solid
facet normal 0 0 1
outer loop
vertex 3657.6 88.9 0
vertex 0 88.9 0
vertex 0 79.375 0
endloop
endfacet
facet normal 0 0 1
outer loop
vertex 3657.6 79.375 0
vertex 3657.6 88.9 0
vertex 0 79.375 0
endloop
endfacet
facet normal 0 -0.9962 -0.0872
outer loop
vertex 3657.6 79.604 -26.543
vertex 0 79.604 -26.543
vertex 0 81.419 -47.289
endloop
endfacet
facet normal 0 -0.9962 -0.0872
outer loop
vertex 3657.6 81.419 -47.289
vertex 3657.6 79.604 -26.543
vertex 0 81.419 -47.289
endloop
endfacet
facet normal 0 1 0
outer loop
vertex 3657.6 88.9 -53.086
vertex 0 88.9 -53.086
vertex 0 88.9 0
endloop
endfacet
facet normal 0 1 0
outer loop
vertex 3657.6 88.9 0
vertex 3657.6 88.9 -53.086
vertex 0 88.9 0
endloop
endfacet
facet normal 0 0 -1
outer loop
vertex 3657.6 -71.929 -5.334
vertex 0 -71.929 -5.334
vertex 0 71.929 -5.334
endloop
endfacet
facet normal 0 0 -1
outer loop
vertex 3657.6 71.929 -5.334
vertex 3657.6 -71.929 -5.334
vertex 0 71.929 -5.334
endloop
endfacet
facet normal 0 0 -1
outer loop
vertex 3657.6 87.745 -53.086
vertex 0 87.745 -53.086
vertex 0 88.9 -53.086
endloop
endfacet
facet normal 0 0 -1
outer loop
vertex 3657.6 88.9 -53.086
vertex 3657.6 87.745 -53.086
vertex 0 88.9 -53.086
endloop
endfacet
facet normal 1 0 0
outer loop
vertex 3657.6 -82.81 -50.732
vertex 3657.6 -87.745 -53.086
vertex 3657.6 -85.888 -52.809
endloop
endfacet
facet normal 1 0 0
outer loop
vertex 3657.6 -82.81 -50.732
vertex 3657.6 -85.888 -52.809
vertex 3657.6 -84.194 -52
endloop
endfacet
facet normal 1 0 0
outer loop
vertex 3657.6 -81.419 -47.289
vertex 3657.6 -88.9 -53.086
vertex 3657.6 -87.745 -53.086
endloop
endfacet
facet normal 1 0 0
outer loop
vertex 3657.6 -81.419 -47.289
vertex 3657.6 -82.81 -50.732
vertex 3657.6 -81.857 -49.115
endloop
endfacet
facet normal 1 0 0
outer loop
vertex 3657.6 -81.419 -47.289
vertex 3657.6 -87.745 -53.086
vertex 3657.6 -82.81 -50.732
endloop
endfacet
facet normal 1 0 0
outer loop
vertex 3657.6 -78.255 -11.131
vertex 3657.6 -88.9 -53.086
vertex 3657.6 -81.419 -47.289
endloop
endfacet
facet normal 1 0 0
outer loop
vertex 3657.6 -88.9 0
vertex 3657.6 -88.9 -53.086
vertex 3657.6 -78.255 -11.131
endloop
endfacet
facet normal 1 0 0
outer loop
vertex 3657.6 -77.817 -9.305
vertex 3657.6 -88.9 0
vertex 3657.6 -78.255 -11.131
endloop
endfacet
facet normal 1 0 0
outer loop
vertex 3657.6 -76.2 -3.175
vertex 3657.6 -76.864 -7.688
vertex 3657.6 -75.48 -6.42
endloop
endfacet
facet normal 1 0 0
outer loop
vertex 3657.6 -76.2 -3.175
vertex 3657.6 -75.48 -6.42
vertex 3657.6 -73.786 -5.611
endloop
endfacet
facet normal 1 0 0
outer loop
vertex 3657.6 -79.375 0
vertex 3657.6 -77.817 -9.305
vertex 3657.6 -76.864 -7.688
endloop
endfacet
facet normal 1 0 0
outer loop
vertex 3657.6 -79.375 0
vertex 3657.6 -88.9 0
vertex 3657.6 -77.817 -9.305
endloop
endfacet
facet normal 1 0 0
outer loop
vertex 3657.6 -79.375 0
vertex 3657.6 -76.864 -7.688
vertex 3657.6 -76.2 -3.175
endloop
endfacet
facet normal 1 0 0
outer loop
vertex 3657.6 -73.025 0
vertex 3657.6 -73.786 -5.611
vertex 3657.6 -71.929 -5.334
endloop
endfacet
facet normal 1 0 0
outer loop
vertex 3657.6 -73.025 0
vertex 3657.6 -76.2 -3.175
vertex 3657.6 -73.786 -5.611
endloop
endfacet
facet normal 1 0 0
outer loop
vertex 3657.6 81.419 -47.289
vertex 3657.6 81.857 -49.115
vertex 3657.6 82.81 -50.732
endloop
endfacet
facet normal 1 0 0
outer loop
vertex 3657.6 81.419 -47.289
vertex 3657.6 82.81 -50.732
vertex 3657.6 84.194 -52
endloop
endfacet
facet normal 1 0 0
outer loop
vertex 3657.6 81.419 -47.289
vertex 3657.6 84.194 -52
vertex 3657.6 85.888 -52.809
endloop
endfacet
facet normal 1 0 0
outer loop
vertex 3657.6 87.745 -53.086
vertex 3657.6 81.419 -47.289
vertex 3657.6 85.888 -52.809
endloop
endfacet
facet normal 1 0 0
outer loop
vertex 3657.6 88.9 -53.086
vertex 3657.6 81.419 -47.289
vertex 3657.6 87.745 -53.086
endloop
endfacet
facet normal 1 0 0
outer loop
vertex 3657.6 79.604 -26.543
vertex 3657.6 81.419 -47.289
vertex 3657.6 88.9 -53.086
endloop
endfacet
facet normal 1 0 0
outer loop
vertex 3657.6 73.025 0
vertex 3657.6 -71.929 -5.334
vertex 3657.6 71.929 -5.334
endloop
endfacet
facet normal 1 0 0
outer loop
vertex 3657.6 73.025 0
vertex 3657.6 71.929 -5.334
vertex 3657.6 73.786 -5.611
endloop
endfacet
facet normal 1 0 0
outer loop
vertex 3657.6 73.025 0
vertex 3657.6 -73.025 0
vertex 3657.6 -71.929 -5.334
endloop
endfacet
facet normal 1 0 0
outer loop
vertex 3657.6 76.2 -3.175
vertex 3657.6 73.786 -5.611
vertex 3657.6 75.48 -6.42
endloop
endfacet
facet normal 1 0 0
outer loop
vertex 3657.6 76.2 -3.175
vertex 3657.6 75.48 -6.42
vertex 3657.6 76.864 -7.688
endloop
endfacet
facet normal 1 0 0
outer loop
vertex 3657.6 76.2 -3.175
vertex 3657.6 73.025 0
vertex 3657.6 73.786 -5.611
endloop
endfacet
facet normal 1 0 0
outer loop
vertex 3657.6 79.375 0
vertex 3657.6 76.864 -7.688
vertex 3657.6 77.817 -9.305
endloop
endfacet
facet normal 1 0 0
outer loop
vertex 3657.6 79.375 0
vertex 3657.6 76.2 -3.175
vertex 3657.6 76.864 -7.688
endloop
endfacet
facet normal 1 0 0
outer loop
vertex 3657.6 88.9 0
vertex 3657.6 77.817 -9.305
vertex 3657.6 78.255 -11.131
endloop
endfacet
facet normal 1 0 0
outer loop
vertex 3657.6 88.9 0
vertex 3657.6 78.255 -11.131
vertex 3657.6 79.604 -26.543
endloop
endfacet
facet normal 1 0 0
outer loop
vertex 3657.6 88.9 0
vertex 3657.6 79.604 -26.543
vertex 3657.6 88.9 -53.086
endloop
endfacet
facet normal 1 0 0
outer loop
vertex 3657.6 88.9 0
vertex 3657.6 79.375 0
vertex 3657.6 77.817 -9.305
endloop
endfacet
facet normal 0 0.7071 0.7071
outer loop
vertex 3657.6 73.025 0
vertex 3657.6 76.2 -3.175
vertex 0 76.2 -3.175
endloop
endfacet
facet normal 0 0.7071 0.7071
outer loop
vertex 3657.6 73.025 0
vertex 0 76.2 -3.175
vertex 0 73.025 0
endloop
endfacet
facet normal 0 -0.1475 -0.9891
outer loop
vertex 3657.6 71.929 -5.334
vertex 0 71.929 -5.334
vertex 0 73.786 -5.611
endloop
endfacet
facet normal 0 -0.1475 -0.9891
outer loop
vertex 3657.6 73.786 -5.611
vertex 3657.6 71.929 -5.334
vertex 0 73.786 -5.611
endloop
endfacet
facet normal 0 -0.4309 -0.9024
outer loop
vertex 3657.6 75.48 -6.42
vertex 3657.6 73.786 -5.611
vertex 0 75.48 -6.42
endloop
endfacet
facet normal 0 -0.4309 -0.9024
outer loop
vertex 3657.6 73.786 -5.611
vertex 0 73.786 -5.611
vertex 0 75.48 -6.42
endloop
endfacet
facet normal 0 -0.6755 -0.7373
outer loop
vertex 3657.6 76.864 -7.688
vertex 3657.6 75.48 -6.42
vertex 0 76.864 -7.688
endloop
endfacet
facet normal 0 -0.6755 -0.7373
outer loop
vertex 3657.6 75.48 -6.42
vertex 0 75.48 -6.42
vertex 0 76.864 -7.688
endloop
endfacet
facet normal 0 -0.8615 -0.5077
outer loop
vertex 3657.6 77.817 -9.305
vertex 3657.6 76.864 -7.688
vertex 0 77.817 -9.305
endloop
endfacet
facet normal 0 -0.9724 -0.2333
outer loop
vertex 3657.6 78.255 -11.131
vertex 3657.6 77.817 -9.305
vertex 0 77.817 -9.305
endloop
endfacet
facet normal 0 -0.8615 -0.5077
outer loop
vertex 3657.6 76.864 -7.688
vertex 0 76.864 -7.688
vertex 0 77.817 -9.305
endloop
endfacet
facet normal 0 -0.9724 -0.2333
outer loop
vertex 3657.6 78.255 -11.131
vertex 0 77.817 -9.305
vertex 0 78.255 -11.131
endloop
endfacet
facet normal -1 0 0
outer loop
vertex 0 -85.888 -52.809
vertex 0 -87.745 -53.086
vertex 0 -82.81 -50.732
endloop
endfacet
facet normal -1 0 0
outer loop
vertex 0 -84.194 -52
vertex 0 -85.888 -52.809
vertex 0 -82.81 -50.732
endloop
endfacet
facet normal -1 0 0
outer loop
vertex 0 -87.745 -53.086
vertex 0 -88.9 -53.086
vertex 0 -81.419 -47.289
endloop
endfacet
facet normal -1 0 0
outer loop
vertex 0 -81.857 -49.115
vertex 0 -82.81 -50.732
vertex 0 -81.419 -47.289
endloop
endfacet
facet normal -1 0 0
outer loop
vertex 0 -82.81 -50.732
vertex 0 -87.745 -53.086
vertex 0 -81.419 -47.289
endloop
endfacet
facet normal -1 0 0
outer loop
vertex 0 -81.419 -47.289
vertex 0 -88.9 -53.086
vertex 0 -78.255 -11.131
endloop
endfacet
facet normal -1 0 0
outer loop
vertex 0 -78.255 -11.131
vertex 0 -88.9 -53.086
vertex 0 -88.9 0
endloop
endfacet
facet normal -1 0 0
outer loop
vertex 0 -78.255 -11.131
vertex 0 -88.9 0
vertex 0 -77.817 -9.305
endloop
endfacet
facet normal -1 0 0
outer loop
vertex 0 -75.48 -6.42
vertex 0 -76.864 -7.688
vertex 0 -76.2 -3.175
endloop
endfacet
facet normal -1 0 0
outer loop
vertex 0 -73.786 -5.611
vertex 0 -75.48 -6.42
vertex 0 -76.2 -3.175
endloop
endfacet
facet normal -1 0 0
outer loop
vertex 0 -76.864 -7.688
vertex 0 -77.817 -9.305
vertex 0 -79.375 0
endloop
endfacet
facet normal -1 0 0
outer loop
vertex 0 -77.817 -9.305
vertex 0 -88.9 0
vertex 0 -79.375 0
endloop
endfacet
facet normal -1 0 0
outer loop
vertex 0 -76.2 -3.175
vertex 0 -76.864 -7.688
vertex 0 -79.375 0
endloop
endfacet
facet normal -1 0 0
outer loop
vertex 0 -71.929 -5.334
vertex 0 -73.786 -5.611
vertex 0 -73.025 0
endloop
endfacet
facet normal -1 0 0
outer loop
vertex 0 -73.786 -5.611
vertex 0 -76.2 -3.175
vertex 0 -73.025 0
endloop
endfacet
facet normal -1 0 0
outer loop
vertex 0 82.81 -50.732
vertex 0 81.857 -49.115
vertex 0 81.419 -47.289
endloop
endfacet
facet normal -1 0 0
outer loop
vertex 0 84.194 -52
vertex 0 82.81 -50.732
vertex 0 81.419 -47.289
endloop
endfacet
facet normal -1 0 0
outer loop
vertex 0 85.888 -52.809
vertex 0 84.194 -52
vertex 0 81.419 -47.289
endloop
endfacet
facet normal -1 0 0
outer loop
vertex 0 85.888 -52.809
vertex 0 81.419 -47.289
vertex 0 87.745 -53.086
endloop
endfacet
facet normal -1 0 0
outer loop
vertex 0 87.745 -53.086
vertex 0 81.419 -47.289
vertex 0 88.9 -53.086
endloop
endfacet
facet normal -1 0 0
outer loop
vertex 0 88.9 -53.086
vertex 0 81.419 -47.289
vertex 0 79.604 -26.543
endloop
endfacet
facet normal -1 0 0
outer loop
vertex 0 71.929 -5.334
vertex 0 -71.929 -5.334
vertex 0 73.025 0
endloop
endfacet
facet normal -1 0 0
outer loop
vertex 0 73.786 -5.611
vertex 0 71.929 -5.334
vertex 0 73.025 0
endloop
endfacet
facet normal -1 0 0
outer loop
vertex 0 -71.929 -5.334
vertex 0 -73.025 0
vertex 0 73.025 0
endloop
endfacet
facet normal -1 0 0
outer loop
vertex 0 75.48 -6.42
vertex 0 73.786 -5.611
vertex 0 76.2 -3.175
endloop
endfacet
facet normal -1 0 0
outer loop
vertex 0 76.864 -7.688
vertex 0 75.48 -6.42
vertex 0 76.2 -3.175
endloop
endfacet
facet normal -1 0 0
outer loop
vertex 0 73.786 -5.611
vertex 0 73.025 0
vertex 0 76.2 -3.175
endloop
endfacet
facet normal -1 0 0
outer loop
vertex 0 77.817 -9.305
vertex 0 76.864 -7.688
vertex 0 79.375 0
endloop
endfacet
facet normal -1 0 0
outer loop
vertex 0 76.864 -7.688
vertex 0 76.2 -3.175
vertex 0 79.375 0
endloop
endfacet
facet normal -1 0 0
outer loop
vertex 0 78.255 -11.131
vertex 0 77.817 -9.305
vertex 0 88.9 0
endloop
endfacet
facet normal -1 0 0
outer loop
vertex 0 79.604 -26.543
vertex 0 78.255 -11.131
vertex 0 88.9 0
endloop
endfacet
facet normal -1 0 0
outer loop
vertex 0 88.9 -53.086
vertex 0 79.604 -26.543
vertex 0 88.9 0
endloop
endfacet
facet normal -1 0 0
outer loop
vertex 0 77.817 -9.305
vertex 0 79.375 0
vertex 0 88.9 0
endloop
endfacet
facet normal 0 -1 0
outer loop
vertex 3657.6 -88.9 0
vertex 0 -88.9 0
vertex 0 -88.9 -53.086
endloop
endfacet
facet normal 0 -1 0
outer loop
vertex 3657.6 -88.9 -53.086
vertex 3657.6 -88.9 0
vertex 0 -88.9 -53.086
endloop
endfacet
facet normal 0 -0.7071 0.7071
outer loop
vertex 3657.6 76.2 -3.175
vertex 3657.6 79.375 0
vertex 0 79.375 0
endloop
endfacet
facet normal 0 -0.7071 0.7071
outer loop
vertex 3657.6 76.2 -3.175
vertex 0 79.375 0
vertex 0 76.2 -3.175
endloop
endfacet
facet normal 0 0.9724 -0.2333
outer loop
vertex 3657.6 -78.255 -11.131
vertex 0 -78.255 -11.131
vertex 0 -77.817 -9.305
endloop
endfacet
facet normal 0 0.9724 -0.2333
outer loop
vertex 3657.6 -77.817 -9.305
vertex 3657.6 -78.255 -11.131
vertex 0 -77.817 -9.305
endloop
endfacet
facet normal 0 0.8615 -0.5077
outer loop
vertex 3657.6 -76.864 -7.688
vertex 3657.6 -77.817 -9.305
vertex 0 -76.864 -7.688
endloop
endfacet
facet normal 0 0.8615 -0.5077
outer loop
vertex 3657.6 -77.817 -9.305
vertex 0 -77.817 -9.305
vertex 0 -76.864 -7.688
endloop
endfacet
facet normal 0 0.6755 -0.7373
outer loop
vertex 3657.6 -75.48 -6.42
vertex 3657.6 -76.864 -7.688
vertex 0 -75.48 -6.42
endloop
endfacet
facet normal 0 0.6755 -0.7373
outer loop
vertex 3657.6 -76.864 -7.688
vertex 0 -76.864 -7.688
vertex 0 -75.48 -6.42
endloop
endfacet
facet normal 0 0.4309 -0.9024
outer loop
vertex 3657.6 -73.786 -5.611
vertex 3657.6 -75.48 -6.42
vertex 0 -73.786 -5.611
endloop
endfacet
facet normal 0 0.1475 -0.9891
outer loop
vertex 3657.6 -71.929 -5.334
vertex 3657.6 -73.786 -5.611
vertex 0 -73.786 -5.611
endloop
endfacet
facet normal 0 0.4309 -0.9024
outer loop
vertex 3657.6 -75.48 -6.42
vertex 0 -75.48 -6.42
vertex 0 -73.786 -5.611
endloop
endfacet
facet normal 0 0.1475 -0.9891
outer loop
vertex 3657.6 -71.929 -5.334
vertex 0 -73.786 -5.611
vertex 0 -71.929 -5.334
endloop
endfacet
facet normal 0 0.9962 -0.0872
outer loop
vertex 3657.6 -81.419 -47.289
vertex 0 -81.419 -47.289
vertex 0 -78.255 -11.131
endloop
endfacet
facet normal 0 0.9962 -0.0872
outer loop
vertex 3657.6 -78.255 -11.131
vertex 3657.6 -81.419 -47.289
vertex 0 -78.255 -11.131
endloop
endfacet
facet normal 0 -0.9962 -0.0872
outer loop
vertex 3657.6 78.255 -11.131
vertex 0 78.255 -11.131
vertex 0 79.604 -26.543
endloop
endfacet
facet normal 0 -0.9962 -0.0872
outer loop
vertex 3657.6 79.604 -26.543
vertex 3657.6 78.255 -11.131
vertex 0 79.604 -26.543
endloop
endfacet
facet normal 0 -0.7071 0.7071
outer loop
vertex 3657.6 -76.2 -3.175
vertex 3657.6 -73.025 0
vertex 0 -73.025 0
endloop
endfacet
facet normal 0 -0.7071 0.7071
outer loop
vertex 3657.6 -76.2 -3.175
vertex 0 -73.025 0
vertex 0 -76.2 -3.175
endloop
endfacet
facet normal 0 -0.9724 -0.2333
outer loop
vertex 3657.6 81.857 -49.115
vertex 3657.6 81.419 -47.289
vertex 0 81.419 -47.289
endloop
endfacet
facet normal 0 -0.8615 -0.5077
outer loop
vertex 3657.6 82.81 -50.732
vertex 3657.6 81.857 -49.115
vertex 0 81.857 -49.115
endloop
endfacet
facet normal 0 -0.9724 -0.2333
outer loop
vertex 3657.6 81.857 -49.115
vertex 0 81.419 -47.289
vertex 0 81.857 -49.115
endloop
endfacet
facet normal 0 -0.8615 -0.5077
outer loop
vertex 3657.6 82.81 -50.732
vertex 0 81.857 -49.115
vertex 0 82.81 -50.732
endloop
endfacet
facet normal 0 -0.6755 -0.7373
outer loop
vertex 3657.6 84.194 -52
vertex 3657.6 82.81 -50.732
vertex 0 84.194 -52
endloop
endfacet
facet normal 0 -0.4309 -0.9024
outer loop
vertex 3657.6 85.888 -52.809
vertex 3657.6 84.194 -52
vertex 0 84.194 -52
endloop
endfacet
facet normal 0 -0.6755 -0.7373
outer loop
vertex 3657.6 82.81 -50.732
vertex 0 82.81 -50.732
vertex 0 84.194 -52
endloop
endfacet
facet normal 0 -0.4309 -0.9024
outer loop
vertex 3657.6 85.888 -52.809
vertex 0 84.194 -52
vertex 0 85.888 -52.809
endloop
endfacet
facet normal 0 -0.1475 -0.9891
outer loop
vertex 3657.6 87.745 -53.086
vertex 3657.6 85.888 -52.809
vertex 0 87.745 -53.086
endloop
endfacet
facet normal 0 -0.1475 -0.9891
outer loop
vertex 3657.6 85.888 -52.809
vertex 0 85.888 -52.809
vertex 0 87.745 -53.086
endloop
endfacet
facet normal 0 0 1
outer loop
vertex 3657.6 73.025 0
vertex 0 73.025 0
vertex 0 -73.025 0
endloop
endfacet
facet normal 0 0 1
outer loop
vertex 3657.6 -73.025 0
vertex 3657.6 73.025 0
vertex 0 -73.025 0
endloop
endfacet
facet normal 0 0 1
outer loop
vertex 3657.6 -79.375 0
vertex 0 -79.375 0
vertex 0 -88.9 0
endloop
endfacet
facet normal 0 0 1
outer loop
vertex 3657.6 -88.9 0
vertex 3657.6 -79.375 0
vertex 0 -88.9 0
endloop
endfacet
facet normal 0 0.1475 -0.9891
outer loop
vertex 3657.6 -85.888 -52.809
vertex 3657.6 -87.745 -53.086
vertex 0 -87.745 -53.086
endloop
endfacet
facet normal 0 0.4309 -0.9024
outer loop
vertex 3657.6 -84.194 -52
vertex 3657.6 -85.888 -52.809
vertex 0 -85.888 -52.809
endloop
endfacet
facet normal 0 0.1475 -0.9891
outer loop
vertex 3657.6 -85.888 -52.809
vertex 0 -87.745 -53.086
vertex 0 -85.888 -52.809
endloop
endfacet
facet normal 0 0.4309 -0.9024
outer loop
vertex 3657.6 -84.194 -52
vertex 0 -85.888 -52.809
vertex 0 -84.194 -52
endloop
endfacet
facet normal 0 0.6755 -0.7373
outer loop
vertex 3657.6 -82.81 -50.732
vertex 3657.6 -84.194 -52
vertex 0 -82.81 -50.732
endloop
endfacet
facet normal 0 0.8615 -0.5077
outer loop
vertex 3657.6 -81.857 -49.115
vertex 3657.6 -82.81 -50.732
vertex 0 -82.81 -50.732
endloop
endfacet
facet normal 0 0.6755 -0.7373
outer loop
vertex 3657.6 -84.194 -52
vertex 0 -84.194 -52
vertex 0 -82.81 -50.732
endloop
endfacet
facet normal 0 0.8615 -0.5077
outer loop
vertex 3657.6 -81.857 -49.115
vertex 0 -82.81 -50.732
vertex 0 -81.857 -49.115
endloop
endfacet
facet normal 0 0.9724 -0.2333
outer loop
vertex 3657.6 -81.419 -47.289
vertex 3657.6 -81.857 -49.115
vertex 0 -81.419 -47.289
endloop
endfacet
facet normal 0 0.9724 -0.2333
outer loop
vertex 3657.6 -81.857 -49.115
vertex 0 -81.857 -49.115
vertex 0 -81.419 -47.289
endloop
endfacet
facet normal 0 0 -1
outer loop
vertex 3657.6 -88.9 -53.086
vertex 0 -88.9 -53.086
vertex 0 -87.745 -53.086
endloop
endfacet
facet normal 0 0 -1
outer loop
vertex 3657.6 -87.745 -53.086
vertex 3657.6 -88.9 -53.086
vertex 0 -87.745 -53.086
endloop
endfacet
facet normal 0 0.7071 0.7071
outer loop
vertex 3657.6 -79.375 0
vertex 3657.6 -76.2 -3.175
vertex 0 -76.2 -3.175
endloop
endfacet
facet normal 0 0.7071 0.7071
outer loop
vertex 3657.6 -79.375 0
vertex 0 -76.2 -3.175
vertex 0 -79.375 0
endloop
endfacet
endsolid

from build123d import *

# Parameters (mm, degrees)
F1_DEPTH = 3657.6


with BuildPart() as f1:
    # F0 (on Right) → F1 (new body)
    with BuildSketch(Plane.YZ):
        with BuildLine():
            Line((88.9, -26.543), (88.9, 0))
            Line((88.9, 0), (79.375, 0))
            Line((79.375, 0), (76.2, -3.175))
            Line((76.2, -3.175), (73.025, 0))
            Line((73.025, 0), (-73.025, 0))
            Line((-73.025, 0), (-76.2, -3.175))
            Line((-76.2, -3.175), (-79.375, 0))
            Line((-79.375, 0), (-88.9, 0))
            Line((-88.9, 0), (-88.9, -53.086))
            Line((-88.9, -53.086), (-87.744515, -53.086))
            ThreePointArc((-87.744515, -53.086), (-83.454517, -51.417711), (-81.418678, -47.289439))
            Line((-81.418678, -47.289439), (-78.255186, -11.130561))
            ThreePointArc((-78.255186, -11.130561), (-76.219348, -7.002289), (-71.92935, -5.334))
            Line((-71.92935, -5.334), (71.92935, -5.334))
            ThreePointArc((71.92935, -5.334), (76.219348, -7.002289), (78.255186, -11.130561))
            Line((78.255186, -11.130561), (79.6036, -26.543))
            Line((79.6036, -26.543), (88.9, -26.543))
        make_face()
        with BuildLine():
            Line((88.9, -53.086), (88.9, -26.543))
            Line((88.9, -26.543), (79.6036, -26.543))
            Line((79.6036, -26.543), (81.418678, -47.289439))
            ThreePointArc((81.418678, -47.289439), (83.454517, -51.417711), (87.744515, -53.086))
            Line((87.744515, -53.086), (88.9, -53.086))
        make_face()
    extrude(amount=F1_DEPTH)


solid = f1.part
